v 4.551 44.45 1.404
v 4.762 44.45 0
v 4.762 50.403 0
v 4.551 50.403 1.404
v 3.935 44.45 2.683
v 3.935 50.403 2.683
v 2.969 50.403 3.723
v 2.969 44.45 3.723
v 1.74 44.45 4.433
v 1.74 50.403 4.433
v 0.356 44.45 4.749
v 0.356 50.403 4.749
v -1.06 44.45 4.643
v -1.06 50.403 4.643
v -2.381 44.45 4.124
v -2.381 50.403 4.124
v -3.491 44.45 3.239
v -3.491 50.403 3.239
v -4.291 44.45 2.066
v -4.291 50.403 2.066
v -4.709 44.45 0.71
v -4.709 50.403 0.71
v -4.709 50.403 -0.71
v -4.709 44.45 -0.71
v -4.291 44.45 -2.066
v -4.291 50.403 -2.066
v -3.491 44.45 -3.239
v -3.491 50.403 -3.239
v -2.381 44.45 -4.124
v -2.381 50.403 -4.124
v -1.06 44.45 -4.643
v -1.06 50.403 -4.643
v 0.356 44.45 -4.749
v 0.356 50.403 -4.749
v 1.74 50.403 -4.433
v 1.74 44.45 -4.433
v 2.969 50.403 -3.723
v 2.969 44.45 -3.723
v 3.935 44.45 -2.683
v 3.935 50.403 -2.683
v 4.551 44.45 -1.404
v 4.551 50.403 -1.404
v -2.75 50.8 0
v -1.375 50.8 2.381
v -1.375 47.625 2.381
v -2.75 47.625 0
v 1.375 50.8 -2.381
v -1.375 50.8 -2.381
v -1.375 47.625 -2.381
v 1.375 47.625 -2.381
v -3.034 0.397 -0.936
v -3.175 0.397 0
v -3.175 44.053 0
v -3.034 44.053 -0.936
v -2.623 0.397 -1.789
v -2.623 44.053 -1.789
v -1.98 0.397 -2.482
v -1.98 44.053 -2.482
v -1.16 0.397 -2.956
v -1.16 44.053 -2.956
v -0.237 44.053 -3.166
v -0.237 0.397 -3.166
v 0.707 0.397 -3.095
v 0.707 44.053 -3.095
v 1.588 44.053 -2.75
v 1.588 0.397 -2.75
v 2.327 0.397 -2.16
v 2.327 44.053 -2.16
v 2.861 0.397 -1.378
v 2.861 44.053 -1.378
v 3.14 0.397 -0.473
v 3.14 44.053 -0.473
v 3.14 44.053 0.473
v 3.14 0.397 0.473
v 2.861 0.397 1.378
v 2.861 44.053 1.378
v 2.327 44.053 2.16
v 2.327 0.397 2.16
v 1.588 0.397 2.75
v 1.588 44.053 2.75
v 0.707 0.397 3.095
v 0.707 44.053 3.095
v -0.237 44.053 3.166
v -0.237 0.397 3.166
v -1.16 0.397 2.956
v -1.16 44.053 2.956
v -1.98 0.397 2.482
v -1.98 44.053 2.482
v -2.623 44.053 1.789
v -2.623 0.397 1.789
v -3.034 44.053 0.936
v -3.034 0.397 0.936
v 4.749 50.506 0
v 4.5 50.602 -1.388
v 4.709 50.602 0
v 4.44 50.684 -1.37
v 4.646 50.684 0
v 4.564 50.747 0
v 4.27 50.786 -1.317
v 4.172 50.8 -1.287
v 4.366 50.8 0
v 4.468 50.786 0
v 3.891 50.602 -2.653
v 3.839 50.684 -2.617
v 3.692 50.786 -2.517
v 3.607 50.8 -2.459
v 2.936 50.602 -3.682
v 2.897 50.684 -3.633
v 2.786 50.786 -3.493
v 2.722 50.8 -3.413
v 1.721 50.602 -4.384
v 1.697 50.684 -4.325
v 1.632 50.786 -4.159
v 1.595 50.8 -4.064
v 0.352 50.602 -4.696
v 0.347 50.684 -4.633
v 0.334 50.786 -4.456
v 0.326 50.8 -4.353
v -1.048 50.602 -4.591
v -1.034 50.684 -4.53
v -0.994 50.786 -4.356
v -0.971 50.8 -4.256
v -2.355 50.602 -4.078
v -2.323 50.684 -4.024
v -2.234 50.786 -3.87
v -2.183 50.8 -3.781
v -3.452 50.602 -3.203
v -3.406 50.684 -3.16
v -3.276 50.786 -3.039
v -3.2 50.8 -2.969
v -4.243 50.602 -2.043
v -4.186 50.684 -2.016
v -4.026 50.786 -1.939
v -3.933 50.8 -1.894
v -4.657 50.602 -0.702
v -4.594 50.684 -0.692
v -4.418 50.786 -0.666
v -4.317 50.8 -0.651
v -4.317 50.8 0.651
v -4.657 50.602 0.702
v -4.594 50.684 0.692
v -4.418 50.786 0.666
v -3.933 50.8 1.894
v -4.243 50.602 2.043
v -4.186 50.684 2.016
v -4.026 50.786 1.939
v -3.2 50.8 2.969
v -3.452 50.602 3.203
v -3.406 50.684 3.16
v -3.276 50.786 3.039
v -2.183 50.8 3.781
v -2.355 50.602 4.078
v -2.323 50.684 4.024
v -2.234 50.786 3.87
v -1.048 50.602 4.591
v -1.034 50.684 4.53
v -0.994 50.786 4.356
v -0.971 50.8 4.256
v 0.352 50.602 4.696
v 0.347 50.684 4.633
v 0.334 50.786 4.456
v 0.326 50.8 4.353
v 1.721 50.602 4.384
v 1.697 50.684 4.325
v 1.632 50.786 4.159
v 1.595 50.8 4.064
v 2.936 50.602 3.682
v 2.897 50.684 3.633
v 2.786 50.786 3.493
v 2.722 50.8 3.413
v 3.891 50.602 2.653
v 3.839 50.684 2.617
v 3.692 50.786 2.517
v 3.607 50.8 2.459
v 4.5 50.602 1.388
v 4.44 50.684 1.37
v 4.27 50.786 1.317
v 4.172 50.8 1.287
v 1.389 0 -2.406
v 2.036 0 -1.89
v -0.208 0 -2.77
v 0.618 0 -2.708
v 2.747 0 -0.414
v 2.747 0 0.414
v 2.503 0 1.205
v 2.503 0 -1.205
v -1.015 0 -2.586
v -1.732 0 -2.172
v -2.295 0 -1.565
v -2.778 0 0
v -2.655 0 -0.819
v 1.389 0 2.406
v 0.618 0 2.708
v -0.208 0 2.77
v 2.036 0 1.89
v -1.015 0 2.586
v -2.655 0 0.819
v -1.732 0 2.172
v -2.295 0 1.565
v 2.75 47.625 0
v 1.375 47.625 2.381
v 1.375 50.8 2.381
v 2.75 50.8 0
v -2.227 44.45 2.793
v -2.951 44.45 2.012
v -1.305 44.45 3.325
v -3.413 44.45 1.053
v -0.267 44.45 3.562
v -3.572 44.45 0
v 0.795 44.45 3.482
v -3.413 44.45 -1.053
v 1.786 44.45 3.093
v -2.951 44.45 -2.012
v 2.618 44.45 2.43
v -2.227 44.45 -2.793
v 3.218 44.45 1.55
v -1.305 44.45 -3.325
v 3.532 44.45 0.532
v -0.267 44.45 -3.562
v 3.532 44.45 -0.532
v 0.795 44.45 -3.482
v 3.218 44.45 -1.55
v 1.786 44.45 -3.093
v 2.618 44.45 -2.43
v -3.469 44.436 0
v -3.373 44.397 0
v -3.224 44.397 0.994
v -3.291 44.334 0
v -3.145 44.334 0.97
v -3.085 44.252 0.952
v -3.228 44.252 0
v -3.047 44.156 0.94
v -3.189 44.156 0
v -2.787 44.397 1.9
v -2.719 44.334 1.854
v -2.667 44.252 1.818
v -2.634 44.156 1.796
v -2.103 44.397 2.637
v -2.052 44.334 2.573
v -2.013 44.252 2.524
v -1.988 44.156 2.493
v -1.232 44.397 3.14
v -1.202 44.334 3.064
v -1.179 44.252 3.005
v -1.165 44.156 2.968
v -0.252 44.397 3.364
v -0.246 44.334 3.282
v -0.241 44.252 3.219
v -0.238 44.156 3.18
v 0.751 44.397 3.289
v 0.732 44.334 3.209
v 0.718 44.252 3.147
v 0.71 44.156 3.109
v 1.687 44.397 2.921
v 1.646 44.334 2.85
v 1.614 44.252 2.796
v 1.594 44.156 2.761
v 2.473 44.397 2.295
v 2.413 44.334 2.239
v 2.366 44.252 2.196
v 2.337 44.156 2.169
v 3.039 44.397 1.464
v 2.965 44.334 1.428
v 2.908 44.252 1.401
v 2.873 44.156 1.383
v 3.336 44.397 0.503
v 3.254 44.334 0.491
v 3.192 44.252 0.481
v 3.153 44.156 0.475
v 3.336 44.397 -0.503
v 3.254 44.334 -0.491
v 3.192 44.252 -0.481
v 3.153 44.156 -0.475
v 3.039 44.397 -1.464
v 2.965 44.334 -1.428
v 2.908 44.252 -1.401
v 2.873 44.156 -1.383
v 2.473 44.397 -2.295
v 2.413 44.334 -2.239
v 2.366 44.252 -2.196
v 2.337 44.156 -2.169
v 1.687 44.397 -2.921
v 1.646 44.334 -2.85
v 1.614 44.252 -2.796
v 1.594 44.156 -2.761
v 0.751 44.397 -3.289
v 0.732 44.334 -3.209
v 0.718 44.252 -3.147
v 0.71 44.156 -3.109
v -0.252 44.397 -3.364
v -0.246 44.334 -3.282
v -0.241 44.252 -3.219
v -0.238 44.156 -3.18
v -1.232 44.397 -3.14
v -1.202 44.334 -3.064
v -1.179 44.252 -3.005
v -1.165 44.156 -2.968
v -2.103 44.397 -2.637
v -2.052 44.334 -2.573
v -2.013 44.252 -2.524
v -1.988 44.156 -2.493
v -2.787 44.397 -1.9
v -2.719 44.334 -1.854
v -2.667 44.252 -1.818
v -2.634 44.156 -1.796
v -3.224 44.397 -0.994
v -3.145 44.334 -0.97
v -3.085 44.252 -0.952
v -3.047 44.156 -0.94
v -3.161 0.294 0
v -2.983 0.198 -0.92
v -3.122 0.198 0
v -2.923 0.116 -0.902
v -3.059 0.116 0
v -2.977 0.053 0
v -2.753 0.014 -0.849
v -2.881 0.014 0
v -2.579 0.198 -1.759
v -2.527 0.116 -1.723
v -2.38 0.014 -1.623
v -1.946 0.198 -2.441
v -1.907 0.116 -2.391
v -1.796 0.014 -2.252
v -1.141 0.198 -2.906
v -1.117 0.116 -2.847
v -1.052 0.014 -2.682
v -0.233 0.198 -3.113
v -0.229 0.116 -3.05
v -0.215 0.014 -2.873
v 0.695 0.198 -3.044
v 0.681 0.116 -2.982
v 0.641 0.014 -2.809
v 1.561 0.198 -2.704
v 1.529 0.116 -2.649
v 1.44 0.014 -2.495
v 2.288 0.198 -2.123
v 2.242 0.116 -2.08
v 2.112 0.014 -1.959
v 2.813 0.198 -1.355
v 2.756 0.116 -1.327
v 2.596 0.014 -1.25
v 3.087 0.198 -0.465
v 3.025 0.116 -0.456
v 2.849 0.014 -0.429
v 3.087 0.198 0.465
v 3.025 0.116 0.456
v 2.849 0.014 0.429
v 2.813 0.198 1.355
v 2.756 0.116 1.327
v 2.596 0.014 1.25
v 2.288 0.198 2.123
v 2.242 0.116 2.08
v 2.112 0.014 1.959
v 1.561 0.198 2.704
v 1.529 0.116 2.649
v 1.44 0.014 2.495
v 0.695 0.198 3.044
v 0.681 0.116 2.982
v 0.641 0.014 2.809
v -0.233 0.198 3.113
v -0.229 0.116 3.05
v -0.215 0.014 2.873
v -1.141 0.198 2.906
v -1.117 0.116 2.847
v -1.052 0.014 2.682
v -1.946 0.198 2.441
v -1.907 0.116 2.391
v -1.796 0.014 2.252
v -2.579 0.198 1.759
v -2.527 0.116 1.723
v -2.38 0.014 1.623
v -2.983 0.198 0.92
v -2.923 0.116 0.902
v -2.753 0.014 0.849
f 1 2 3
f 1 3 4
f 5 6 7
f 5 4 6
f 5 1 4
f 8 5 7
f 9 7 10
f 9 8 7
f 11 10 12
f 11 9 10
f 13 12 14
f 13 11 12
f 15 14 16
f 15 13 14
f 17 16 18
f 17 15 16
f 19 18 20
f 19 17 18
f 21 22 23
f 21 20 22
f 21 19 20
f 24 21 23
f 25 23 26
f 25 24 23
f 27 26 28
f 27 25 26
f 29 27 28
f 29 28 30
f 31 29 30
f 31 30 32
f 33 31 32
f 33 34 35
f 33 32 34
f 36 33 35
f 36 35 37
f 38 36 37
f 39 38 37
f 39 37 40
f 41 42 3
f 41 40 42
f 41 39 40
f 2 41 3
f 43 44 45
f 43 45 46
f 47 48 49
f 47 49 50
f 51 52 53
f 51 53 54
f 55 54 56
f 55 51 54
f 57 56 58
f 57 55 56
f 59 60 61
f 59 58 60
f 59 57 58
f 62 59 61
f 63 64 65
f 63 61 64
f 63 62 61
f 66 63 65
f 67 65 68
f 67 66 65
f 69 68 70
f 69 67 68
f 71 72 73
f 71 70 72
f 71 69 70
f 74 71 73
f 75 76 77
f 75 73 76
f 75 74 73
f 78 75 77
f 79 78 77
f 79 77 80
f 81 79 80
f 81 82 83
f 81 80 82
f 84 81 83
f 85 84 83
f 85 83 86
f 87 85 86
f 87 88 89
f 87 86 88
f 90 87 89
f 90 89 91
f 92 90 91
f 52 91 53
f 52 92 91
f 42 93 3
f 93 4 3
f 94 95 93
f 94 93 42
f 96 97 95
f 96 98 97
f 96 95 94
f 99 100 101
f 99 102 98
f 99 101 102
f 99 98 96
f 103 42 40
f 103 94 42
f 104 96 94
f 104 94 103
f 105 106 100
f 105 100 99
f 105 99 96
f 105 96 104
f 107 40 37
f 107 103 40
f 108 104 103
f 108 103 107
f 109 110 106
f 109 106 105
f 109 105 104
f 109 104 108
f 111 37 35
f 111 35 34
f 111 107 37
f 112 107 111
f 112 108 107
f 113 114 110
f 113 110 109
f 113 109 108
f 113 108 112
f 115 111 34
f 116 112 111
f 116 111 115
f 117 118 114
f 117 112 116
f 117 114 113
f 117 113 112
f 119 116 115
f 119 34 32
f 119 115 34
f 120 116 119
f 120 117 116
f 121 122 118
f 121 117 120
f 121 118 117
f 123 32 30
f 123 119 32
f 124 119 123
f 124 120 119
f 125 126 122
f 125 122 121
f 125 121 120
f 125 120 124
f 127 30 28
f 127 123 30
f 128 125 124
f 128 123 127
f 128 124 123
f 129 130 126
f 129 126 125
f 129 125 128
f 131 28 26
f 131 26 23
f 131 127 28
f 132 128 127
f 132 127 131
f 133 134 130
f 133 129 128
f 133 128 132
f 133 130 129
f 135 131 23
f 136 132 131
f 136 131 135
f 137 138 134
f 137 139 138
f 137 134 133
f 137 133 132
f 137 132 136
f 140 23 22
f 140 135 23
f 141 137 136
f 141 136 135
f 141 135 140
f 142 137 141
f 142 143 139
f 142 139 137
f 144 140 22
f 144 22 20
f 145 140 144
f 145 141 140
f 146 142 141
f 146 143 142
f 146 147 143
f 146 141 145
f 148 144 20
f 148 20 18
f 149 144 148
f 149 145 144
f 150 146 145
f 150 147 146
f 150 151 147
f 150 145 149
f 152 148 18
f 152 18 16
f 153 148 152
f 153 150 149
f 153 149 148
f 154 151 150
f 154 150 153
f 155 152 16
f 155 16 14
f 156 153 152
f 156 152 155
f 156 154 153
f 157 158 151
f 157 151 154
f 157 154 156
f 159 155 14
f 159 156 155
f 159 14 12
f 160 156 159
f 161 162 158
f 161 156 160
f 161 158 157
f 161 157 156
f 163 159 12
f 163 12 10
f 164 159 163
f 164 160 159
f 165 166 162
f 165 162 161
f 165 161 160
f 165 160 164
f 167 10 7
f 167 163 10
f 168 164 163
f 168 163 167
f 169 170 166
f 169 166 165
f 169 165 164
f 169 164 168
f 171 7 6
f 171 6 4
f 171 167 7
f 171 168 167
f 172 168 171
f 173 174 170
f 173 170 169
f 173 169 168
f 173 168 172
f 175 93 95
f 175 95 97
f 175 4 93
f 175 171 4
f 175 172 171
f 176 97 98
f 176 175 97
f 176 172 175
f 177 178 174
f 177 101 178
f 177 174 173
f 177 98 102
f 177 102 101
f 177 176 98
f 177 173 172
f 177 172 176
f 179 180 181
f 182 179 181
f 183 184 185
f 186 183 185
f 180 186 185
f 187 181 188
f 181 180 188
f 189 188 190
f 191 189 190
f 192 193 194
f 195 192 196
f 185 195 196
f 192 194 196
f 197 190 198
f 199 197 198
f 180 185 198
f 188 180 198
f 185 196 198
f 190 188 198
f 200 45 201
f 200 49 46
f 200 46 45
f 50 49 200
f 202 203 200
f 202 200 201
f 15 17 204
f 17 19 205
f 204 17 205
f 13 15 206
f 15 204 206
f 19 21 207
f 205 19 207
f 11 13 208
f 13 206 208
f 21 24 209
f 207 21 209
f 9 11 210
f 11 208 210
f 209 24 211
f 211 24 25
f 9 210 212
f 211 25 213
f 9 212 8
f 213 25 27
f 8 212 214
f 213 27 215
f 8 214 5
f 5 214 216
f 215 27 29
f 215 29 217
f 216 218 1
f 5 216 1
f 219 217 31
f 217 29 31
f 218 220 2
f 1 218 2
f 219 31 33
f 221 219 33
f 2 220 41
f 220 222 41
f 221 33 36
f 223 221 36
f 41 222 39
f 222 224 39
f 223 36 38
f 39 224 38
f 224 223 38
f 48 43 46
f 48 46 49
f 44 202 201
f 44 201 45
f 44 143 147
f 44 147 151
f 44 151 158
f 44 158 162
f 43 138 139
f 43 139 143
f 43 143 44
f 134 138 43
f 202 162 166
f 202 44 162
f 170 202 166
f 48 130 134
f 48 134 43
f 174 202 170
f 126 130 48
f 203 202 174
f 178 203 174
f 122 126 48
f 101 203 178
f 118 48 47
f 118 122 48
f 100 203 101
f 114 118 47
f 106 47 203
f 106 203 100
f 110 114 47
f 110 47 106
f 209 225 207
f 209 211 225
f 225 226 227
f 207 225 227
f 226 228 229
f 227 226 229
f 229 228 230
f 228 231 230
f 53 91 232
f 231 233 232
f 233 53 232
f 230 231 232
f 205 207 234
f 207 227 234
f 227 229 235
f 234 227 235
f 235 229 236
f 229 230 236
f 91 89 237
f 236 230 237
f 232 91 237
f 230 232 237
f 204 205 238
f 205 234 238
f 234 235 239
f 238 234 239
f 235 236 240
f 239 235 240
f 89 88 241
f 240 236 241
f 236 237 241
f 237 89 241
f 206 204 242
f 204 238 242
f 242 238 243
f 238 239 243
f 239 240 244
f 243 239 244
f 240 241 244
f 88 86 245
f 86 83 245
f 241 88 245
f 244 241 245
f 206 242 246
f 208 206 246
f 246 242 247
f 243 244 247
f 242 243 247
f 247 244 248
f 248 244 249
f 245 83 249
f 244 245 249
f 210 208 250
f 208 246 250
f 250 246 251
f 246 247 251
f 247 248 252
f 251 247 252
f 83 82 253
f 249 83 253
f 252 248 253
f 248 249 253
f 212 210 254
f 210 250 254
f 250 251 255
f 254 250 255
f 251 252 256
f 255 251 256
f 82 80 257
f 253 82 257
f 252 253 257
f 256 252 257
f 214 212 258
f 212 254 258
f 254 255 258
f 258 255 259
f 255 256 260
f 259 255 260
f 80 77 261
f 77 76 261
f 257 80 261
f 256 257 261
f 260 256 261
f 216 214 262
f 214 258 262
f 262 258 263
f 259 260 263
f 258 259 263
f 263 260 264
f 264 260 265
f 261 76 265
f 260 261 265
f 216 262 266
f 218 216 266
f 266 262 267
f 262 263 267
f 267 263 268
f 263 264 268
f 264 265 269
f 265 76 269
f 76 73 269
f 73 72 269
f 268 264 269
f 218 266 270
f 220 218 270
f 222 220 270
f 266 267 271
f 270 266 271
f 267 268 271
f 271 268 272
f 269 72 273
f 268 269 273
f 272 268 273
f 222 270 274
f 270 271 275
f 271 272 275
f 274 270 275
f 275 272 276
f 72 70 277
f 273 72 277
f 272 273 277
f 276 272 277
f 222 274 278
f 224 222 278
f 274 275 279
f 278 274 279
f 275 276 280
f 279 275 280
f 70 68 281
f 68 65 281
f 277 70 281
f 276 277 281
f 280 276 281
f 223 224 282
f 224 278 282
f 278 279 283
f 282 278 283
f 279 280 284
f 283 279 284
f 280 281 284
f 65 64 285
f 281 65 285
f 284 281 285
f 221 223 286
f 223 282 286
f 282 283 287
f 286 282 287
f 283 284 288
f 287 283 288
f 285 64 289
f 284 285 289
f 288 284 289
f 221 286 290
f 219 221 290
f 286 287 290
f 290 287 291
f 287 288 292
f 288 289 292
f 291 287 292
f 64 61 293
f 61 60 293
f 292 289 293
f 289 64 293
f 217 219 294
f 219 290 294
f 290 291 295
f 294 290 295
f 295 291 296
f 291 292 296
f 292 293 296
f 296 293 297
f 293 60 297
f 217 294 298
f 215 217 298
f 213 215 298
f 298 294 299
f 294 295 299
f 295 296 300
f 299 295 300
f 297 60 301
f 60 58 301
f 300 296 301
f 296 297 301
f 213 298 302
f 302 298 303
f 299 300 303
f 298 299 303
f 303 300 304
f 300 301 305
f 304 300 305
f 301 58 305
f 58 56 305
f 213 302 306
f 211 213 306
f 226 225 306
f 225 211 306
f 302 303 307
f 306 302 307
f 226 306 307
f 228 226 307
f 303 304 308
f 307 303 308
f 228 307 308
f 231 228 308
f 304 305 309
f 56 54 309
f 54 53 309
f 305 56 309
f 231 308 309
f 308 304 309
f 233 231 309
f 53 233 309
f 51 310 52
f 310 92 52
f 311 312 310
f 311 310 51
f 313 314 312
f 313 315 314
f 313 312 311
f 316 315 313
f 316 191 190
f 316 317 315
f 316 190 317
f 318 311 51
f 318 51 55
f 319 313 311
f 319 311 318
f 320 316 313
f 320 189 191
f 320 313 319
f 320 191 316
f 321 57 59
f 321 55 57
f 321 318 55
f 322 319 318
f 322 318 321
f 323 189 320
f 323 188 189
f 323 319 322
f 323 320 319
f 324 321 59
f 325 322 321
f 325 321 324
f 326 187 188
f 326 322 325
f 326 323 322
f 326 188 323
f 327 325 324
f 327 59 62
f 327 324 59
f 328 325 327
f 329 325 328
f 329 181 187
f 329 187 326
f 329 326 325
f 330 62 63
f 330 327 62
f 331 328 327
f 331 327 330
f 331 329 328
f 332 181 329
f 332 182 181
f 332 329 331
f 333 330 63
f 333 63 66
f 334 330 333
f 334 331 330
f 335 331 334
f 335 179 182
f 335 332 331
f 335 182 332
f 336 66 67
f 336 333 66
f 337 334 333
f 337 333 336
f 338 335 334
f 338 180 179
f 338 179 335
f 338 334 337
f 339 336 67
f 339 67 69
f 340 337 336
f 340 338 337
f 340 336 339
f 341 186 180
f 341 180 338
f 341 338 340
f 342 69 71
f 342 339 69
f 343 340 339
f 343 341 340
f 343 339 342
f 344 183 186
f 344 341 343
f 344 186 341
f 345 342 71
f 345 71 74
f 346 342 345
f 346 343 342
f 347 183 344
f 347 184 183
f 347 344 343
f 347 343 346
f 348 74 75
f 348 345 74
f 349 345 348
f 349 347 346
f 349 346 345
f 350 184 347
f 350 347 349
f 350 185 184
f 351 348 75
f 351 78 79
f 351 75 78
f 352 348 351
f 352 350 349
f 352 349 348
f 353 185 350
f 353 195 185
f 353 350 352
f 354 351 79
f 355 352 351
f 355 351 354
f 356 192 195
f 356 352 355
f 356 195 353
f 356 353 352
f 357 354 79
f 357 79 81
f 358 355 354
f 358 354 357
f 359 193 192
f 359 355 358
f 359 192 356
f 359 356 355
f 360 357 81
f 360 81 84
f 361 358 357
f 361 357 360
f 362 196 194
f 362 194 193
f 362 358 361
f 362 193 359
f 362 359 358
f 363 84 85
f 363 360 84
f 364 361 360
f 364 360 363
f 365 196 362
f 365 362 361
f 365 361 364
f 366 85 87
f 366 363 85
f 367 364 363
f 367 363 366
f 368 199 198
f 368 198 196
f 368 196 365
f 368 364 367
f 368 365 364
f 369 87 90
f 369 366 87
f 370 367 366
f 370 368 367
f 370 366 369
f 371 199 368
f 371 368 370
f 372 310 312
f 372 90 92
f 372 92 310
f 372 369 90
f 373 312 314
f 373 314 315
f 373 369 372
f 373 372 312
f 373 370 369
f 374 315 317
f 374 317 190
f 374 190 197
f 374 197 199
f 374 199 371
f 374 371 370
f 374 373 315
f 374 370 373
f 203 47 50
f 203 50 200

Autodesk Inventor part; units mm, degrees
ref_plane "YZ Plane" through (0, 0, 0) normal (1, 0, 0) x (0, 1, 0)
ref_plane "XZ Plane" through (0, 0, 0) normal (0, 1, 0) x (-1, 0, 0)
ref_plane "XY Plane" through (0, 0, 0) normal (0, 0, 1) x (1, 0, 0)
sketch "Sketch1" plane through (0, 0, 0) normal (0, 1, 0) x (-1, 0, 0)
  circle A0 centre (0, 0) radius 3.175
  dimension "d0" = 6.35
extrude "Extrusion1" add sketch "Sketch1" along normal blind 44.45
sketch "Sketch2" plane through (0, 44.45, 0) normal (0, 1, 0) x (1, 0, 0)
  circle A0 centre (0, 0) radius 3.175 projected
  circle A1 centre (0, 0) radius 4.7625
  dimension "d3" = 9.525
extrude "Extrusion2" add sketch "Sketch2" along normal blind 6.35 contours A0 | A1
sketch "Sketch3" plane through (0, 50.8, 0) normal (0, 1, 0) x (1, 0, 0)
  circle A0 centre (0, 0) radius 4.7625 projected
  line L0 (-1.3748, 2.3812) -> (1.3748, 2.3813)
  line L1 (1.3748, 2.3813) -> (2.7496, 0)
  line L2 (2.7496, 0) -> (1.3748, -2.3813)
  line L3 (1.3748, -2.3813) -> (-1.3748, -2.3813)
  line L4 (-1.3748, -2.3813) -> (-2.7496, 0)
  line L5 (-2.7496, 0) -> (-1.3748, 2.3812)
  dimension "d6" = 4.7625
extrude "Extrusion3" cut sketch "Sketch3" against normal blind 3.175 contours L0 L1 L2 L3 L4 L5
fillet "Fillet1" radius 0.3969 3 edges at (3.175, 44.45, 0) (-4.7625, 50.8, 0) (3.175, 0, 0)
properties part number "Bolt_0.25_20_1.75len_SocketHead" material "Stainless Steel, Austenitic"
